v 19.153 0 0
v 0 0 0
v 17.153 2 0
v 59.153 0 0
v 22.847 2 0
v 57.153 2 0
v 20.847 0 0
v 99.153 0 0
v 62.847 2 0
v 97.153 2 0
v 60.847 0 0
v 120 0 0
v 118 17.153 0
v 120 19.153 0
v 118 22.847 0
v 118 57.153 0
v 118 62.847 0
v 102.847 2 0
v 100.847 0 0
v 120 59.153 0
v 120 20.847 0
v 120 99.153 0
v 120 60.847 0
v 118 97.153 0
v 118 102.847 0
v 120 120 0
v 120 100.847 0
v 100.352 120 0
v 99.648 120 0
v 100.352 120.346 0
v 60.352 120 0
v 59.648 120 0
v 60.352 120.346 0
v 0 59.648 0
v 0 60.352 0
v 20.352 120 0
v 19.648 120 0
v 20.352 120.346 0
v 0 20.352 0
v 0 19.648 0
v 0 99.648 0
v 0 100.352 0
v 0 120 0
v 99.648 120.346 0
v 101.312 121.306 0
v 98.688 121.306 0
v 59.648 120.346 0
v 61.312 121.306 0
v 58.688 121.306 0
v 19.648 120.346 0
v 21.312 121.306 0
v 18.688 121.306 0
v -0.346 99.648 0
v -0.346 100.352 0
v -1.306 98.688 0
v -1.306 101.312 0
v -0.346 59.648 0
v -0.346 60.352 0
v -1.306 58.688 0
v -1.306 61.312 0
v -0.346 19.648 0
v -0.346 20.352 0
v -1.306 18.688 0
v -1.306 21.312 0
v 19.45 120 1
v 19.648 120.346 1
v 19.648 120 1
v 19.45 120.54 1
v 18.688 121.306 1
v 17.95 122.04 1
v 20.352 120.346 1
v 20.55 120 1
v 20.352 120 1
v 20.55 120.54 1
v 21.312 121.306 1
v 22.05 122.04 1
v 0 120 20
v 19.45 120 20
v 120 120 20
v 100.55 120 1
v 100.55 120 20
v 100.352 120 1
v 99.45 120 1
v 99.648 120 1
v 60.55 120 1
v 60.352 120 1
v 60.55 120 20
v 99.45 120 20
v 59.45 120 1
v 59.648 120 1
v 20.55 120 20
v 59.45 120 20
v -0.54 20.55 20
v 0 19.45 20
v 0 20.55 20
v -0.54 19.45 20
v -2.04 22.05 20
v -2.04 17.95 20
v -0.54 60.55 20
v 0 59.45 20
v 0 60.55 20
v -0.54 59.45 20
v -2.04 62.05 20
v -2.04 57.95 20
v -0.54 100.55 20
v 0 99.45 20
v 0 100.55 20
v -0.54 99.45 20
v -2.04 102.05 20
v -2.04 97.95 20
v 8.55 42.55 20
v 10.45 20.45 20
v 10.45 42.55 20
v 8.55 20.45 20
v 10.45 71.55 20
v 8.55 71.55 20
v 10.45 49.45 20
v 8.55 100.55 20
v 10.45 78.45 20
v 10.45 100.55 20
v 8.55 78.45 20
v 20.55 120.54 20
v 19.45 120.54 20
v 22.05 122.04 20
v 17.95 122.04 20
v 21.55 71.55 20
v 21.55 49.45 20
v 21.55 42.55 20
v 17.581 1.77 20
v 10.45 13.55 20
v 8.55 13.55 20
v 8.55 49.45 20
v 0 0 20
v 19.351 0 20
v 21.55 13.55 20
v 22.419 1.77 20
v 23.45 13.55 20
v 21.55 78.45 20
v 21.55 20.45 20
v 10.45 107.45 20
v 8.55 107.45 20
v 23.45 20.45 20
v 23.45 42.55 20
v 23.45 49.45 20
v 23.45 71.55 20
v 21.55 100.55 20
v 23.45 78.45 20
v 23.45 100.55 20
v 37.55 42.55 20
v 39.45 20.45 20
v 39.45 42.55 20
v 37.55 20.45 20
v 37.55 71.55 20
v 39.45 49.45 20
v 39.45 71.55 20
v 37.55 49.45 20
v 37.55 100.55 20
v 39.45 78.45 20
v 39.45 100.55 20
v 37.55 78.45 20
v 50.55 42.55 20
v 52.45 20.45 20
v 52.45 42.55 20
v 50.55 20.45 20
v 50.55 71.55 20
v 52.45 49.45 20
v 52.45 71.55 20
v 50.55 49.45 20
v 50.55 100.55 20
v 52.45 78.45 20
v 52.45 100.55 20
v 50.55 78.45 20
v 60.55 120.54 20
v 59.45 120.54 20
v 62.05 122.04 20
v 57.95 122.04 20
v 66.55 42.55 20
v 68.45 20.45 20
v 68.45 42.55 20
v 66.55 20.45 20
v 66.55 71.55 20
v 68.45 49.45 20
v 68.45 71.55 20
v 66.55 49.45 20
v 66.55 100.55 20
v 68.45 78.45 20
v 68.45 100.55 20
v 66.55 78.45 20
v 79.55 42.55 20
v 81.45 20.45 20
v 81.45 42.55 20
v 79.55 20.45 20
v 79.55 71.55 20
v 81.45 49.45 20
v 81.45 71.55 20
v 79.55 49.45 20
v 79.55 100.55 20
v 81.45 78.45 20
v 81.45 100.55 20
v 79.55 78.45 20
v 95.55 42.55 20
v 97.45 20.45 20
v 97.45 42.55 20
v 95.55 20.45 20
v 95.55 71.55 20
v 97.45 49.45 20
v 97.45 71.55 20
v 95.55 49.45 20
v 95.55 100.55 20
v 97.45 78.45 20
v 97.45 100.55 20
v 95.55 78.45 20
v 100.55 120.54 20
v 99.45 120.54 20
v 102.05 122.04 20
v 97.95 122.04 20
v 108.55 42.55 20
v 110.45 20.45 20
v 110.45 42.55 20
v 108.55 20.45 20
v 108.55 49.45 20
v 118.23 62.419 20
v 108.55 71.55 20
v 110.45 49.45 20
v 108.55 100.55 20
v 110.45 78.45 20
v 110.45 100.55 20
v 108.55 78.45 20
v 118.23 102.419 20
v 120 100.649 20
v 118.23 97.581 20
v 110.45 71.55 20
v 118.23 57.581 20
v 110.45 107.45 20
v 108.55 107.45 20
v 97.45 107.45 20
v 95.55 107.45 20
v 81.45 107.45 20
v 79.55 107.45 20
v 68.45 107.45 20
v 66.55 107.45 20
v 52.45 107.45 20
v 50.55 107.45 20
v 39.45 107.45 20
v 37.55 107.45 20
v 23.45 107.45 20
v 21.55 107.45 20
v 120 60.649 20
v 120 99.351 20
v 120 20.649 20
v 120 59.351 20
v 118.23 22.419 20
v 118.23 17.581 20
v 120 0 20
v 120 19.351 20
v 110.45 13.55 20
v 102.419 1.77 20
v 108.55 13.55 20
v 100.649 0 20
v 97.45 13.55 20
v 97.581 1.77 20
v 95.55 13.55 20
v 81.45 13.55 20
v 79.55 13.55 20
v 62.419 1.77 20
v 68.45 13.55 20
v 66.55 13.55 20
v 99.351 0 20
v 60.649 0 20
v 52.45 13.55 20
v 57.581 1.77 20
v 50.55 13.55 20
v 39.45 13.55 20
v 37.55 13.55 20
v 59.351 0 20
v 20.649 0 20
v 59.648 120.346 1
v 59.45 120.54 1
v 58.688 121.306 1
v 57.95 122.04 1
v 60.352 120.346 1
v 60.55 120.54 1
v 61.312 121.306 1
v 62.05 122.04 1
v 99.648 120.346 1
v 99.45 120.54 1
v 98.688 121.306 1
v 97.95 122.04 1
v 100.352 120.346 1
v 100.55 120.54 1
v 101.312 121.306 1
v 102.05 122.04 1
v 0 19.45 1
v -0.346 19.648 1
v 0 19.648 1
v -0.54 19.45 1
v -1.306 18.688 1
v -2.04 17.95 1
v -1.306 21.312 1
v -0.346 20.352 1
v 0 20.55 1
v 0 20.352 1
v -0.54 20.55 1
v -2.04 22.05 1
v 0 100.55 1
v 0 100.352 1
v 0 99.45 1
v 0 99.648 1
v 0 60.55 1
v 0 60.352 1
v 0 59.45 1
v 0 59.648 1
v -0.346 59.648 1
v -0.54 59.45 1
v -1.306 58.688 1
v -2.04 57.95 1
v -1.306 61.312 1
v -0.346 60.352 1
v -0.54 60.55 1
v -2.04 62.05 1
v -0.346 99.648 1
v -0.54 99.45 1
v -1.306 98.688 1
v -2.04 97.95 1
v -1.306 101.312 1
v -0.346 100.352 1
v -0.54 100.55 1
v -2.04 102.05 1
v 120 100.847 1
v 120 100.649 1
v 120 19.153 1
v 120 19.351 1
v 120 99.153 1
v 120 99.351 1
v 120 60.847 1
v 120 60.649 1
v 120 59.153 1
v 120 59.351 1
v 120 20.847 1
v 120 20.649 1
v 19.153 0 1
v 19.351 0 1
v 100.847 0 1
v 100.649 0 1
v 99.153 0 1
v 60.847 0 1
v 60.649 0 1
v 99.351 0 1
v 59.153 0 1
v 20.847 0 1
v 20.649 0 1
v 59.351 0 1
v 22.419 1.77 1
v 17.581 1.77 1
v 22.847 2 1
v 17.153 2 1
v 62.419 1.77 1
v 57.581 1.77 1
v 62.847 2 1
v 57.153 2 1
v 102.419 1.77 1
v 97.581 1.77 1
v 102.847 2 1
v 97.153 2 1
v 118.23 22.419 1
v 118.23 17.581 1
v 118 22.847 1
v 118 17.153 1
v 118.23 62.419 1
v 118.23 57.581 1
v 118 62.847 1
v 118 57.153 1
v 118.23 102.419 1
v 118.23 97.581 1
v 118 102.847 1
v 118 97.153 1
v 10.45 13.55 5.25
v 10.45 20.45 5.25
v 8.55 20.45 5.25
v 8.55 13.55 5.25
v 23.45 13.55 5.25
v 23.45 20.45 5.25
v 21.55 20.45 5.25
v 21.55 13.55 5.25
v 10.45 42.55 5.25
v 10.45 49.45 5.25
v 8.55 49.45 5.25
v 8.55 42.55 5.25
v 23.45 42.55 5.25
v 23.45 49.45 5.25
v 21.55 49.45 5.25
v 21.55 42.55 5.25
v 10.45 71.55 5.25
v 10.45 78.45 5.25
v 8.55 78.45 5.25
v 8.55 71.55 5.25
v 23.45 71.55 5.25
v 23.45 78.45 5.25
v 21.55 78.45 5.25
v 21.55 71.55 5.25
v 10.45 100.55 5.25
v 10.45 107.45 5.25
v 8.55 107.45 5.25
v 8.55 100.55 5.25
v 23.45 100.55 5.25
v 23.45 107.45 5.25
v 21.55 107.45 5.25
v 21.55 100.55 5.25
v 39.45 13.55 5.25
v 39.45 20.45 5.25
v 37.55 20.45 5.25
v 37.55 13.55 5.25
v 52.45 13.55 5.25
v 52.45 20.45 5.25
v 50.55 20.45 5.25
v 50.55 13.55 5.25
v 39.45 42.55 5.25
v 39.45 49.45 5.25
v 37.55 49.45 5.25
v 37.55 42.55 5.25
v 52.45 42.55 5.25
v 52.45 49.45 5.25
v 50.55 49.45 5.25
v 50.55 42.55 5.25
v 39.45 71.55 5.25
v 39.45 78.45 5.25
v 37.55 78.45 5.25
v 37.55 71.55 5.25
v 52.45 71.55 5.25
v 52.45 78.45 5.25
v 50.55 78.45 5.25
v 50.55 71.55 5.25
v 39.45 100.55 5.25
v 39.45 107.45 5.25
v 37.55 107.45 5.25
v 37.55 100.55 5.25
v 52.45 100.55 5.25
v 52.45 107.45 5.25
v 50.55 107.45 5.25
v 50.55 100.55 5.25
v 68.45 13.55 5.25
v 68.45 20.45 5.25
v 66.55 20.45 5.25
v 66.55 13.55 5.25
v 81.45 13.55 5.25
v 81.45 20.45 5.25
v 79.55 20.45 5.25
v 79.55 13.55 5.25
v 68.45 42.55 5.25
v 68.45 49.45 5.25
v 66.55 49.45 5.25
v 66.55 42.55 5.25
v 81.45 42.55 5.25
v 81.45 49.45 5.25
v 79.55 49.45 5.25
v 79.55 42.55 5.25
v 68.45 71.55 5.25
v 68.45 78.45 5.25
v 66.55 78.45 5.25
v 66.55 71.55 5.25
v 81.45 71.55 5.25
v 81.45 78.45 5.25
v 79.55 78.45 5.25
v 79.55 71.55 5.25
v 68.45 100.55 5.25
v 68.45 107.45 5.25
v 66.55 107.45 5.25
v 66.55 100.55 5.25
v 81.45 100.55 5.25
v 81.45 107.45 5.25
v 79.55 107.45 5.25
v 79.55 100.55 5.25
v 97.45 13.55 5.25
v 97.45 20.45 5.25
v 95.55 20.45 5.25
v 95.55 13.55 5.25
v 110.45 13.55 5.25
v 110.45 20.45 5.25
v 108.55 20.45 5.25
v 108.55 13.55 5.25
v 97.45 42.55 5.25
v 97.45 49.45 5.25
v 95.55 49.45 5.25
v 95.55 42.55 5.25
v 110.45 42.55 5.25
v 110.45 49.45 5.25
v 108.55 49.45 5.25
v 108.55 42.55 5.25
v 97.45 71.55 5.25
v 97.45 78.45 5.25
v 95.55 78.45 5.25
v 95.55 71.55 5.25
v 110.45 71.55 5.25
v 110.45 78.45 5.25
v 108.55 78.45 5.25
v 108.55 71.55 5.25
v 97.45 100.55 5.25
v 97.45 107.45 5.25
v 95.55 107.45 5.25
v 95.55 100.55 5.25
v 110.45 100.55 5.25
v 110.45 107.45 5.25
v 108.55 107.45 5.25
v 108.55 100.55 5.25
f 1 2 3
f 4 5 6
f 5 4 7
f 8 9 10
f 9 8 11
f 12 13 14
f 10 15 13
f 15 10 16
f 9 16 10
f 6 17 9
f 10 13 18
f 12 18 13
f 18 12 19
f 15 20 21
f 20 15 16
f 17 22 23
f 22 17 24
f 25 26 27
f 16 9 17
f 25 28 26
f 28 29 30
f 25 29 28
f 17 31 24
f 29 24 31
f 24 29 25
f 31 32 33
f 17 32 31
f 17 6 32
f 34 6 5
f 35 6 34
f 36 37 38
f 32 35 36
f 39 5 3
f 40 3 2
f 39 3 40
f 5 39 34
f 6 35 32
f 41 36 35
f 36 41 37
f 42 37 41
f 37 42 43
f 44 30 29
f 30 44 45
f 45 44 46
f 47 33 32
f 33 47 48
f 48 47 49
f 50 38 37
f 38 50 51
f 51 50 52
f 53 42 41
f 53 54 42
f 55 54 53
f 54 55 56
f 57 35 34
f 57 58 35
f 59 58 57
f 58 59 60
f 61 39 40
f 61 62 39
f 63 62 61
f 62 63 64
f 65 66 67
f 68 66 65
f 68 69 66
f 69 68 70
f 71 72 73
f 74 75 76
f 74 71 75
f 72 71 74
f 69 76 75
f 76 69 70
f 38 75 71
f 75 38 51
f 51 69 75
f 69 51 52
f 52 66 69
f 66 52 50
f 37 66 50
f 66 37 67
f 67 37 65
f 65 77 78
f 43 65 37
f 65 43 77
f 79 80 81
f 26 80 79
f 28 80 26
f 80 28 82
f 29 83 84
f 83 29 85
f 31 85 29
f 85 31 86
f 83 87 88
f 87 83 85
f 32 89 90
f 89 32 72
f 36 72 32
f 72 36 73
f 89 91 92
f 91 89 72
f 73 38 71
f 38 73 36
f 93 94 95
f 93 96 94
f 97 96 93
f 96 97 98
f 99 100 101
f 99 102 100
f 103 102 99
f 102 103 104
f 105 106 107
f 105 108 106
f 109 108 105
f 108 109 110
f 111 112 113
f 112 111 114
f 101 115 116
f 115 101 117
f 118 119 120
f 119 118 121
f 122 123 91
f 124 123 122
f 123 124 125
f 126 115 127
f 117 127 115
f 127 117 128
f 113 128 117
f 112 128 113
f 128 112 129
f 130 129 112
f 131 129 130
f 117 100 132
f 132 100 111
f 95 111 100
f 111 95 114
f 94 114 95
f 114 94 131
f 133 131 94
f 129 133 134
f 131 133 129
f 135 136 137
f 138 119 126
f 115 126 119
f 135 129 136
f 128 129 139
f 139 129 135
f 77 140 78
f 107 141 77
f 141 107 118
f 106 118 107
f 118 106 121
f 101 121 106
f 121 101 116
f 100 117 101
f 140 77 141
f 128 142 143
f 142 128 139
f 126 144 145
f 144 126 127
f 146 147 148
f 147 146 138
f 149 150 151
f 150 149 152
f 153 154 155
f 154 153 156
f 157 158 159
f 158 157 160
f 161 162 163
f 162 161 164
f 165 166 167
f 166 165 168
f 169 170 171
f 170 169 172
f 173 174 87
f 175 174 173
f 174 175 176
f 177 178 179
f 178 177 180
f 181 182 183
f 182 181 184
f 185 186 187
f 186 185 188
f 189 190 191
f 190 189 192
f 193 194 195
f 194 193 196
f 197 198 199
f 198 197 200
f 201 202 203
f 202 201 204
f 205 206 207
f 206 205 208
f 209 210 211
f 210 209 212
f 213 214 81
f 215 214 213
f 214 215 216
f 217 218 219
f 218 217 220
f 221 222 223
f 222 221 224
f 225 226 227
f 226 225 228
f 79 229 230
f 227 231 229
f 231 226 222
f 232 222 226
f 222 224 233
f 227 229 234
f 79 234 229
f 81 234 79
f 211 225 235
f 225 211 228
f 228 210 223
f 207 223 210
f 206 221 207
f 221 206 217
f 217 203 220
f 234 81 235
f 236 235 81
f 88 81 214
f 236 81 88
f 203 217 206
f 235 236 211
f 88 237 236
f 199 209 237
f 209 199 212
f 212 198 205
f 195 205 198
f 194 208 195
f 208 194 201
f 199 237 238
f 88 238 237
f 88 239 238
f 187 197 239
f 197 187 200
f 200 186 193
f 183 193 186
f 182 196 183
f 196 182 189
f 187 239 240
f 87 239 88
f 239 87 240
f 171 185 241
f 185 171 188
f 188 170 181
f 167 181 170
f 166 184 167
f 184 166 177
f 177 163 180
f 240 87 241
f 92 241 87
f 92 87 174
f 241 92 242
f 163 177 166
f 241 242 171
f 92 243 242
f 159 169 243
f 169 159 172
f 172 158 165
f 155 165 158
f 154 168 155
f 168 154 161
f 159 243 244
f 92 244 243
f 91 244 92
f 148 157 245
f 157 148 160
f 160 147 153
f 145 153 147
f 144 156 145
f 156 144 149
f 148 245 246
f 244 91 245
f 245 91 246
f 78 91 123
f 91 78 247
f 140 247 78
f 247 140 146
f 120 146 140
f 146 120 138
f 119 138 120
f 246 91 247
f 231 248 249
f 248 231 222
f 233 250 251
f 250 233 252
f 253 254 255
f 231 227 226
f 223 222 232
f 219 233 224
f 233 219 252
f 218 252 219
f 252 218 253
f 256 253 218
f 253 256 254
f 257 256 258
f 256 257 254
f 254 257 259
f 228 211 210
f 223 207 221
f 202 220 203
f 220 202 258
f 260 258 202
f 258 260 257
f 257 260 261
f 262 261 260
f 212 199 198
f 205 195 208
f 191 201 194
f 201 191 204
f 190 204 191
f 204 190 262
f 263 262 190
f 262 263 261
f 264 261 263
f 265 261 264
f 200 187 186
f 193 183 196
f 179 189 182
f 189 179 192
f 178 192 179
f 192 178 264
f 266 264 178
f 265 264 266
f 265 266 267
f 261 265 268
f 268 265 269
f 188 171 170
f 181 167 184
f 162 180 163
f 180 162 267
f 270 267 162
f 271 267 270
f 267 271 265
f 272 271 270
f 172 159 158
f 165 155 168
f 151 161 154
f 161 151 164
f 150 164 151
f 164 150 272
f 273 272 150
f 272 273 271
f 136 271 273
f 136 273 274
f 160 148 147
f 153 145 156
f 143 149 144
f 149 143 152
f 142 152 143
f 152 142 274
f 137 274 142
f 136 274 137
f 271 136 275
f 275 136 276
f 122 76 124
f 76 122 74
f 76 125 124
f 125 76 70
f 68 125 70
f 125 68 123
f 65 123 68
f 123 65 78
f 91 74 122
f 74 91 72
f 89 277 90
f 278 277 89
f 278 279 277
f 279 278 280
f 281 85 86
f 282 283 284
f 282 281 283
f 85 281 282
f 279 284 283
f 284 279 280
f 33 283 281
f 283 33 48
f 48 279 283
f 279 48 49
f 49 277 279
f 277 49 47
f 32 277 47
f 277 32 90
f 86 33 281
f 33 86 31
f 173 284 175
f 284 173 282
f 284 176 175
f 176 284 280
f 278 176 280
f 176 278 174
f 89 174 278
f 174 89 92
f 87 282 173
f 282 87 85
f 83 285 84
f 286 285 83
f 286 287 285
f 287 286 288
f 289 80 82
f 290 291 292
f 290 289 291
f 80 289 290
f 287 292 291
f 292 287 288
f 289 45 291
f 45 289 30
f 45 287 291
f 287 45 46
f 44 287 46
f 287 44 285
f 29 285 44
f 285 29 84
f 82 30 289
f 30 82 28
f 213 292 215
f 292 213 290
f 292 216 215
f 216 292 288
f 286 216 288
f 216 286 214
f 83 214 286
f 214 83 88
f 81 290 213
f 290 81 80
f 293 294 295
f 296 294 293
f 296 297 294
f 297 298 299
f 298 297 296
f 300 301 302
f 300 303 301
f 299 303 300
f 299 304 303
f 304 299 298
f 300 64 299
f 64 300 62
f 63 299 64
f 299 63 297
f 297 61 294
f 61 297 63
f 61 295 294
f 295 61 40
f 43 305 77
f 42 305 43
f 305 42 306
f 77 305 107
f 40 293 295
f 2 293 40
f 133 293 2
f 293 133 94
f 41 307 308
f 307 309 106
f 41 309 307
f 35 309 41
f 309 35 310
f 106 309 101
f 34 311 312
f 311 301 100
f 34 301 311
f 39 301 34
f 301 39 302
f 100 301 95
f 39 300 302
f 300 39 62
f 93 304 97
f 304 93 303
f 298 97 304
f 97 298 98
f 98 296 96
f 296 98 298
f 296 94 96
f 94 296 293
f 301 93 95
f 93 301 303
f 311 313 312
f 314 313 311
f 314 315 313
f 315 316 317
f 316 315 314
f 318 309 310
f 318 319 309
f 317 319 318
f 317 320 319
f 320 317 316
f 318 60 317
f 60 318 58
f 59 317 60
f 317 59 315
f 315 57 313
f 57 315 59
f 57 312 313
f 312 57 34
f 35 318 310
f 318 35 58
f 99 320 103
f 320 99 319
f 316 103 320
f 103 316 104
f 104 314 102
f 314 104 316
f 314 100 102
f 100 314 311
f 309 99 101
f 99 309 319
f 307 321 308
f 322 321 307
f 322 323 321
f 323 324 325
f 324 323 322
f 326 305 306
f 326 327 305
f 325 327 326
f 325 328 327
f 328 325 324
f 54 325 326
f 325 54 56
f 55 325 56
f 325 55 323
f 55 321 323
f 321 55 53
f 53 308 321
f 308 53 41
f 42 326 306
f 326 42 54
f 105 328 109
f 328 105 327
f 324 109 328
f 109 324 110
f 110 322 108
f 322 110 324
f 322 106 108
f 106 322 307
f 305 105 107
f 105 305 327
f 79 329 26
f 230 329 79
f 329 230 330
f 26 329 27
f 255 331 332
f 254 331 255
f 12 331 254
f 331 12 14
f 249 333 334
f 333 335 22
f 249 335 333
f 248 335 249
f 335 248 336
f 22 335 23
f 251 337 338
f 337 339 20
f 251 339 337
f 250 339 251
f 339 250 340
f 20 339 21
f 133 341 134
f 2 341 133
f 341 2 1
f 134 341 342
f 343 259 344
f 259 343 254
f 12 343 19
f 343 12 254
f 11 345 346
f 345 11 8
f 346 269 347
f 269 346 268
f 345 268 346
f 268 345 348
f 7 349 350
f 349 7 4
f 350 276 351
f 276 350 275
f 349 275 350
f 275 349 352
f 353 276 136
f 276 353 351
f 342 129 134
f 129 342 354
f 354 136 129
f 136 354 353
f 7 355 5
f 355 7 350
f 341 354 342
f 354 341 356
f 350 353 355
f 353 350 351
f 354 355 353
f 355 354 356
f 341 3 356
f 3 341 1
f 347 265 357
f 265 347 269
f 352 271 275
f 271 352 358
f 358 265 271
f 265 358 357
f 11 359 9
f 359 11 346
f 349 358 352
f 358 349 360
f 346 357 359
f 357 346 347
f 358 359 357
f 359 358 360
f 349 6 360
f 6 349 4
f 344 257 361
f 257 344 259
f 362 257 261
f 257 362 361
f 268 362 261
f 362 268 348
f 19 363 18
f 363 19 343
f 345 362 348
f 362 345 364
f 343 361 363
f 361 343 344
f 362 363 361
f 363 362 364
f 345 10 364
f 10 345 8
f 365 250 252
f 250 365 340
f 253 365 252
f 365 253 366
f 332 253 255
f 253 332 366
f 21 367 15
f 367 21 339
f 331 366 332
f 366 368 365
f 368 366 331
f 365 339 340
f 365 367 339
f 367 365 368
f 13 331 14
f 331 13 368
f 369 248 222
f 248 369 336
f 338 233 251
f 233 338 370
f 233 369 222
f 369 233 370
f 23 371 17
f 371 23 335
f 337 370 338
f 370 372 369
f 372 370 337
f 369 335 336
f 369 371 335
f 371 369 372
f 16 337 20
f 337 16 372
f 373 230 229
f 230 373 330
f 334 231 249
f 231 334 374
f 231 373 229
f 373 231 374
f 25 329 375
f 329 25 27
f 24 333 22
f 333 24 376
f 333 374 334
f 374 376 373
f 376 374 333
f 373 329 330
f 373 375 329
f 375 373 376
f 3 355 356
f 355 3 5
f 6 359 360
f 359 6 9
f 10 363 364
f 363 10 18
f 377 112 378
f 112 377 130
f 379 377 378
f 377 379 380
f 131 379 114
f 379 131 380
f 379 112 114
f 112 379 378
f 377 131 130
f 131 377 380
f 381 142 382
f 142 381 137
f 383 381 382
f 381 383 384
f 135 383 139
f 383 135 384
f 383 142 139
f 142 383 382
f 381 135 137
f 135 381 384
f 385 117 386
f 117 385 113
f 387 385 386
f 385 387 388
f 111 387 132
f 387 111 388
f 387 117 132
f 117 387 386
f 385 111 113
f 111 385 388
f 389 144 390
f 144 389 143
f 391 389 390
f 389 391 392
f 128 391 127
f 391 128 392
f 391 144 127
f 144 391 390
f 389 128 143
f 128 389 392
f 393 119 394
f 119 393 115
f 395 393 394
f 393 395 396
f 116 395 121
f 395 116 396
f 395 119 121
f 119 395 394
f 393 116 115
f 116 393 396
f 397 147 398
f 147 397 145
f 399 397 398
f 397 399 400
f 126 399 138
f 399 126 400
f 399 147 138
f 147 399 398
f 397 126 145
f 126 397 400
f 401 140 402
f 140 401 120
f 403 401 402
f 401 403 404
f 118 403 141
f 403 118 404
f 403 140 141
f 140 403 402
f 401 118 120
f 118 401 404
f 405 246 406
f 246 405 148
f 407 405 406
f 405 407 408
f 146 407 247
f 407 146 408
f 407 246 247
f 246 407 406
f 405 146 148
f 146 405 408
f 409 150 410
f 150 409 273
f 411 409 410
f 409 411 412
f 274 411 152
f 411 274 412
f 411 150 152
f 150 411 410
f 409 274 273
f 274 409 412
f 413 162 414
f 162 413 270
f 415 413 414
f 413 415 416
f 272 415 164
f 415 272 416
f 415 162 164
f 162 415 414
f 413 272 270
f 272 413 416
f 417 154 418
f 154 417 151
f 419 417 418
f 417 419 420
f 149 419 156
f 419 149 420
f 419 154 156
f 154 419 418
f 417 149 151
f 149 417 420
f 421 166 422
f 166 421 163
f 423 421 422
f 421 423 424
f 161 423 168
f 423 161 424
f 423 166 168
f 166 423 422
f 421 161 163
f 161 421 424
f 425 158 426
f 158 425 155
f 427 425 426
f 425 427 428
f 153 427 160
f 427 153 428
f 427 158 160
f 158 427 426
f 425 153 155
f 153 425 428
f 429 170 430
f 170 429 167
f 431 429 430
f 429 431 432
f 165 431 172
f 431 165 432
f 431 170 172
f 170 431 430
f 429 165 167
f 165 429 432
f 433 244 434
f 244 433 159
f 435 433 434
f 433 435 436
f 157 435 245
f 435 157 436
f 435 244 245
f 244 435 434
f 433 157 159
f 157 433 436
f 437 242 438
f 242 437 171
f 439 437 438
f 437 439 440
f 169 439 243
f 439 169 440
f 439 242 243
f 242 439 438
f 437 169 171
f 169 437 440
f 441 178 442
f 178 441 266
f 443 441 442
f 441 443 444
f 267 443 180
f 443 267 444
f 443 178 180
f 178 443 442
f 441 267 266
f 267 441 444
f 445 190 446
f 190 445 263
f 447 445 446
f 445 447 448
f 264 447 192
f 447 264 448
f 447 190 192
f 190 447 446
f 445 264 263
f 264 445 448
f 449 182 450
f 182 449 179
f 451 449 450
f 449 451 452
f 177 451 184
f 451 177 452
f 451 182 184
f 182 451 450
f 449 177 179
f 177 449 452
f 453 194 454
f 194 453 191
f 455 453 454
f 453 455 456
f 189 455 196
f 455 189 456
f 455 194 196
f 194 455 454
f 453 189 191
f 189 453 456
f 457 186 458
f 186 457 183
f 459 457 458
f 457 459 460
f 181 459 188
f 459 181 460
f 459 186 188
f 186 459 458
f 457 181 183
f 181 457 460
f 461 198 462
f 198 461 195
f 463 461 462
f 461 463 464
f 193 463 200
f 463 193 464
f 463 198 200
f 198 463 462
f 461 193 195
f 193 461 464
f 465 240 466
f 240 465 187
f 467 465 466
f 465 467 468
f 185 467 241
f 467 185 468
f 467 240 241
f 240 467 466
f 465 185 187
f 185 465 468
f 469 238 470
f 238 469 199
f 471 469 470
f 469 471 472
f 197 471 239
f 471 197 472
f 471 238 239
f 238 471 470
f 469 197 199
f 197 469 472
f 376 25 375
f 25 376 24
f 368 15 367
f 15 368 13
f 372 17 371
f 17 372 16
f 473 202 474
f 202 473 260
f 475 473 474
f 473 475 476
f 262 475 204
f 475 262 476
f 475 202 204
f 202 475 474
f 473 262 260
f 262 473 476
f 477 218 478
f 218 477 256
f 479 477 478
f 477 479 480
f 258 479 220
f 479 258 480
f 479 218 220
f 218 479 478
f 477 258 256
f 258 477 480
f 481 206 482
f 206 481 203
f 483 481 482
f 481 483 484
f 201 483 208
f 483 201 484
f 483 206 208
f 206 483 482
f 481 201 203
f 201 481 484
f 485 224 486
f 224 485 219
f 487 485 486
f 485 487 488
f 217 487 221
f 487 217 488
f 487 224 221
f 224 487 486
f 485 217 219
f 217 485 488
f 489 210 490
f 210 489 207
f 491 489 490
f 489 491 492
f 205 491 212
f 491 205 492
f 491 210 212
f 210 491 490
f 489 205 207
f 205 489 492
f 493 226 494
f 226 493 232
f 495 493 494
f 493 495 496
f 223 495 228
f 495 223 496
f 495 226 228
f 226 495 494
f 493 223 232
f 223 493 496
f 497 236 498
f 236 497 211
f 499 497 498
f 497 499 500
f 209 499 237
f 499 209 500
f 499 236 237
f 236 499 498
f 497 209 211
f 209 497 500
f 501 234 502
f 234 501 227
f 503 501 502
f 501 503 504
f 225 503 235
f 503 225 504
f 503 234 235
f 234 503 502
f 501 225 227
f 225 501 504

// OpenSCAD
// file: interlockingmodule.scad
//this section defines a module for creating a "rounded" bottom to the box, useful when storing small parts
module RoundBottom(width, length, height){    
    translate([0,length,0])rotate([90,0,0])
    linear_extrude(length, center=false)
    
    difference() {
        translate([-width/2,0,0])square([width,height/2],center=false);
        translate([0,height/2,0])resize([width,height]) circle(d=width*10);
    }
}


module interlockingbox(
    //Box Width in units
    BoxWidthUnits = 3,
    //Box Length in units
    BoxLengthUnits = 3,
    //Box Height in mm
    BoxHeight = 120,
    //Box Floor Thickness in mm
    BoxFloor = 2,
    //North Wall open or closed
    NorthWallOpen = 0, // [0:Closed, 1:Open]
    //South Wall open or closed
    SouthWallOpen = 0 // [0:Closed, 1:Open]
)
{
echo(version=version(2.0));
//comments: Version 2 adds anti-"elephant foot" scaling at bottom of dovetail sections
/* [Size] */
//Box unit size in mm. This defines the size of 1 'unit' for your box.
BoxUnits = 40;
BoxWidth = BoxWidthUnits * BoxUnits;
BoxLength = BoxLengthUnits * BoxUnits;
//Box Wall Thickness in mm
BoxWall = 1;
//Fit Factor. Greater factor = looser fit
FitFactor = 0.18;  // [0:0.05:0.4]
//RoundedBottom = "EW"; // [EW:East-West, NS:North-South]
RoundedBottom = ""; // [EW:East-West, NS:North-South]

/* [Walls] */

/* [Dovetail] */
//Dovetail inside length in mm
DTInsideLength = 1.1;
//Dovetail angle in degrees
DTAngle = 45;
//Dovetail width in mm
DTWidth = 1.5;

/* [Hidden] */
//This helps calculate the length of the 'long' side of the dovetail
DTx=tan(DTAngle)*DTWidth;
//This polygon defines the dovetail shape
DTShape = [[0,0],[DTInsideLength/2,0],[DTInsideLength/2+DTx,DTWidth],[-DTInsideLength/2-DTx,DTWidth],[-DTInsideLength/2,0]];



union(){
    //creates and transforms rounded bottom
    if (RoundedBottom=="EW") {
    translate([0,(BoxWidth/2)+BoxWall,BoxFloor])
    rotate([0,0,-90])
    RoundBottom(BoxWidth-DTWidth-(BoxWall),BoxLength-DTWidth-BoxWall,2*(BoxHeight-BoxFloor));
    }

    //creates rounded bottom oriented North-South
    if (RoundedBottom=="NS") {
    translate([(BoxLength/2)-BoxWall,DTWidth+BoxWall/2,BoxFloor])
    rotate([0,0,0])
    RoundBottom(BoxLength-DTWidth-(BoxWall),BoxWidth-DTWidth-BoxWall,2*(BoxHeight-BoxFloor));
    }

    //Creates main box,without round bottom
    difference(){
        
    union(){
        //main box
    cube([BoxLength,BoxWidth,BoxHeight], center=false);

        //male dovetails
    for (i=[1:BoxLengthUnits])
    translate([(i-1)*BoxUnits+(BoxUnits/2),BoxWidth,0])
        //in 2 sections. first section is slightly scaled down to counter "elephant foot"
        union(){
            linear_extrude(height=1, center=false)
                scale([1-(2*FitFactor),1-(2*FitFactor),1])
                union(){        
                    //this adds a slight offset to the male dovetail for a looser fit
                    translate([-DTInsideLength/2,0,0])
                    square([DTInsideLength,DTWidth]);
                    //main dovetail shape
                    translate([0,DTWidth*FitFactor*2,0])
                    polygon(DTShape);
                };
            translate([0,0,1])
            linear_extrude(height=BoxHeight-1, center=false)
                    union(){
                    //this adds a slight offset to the male dovetail for a looser fit
                    translate([-DTInsideLength/2,0,0])
                    square([DTInsideLength,DTWidth]);
                    //main dovetail shape
                    translate([0,DTWidth*FitFactor*2,0])
                    polygon(DTShape);
                    };
        }        

    for (i=[1:BoxWidthUnits])
    translate([0,(i-1)*BoxUnits+(BoxUnits/2),0])
        //in 2 sections. first section is slightly scaled down to counter "elephant foot"
        rotate([0,0,90])
        union(){
            linear_extrude(height=1, center=false)				//1mm high anti-elephant foot section
                scale([1-(2*FitFactor),1-(2*FitFactor),1])
                union(){        
                    //this adds a slight offset to the male dovetail for a looser fit
                    translate([-DTInsideLength/2,0,0])
                    square([DTInsideLength,DTWidth]);
                    //main dovetail shape
                    translate([0,DTWidth*FitFactor*2,0])
                    polygon(DTShape);
                };
            translate([0,0,1])
            linear_extrude(height=BoxHeight-1, center=false)
                union(){
                    //male dovetail offset
                    translate([-DTInsideLength/2,0,0])
                    square([DTInsideLength,DTWidth]);
                    //main dovetail shape
                    translate([0,DTWidth*FitFactor*2,0])
                    polygon(DTShape);
                };
        }
    }
    //female dovetails
    for (i=[1:BoxLengthUnits])
        union(){
            translate([(i-1)*BoxUnits+(BoxUnits/2),0,0])
                scale([1+FitFactor,1+FitFactor,1])
                linear_extrude(height=BoxHeight, center=false)
                polygon(DTShape);
        
            //added a second dovetail cutout at the bottom, scaled up to counter "elephant foot" when printed
            translate([(i-1)*BoxUnits+(BoxUnits/2),0,0])
                scale([1+(3*FitFactor),1+(3*FitFactor),1])
                linear_extrude(height=1, center=false)
                polygon(DTShape);					
        }

    for (i=[1:BoxWidthUnits])
        union(){
            translate([BoxLength,(i-1)*BoxUnits+(BoxUnits/2),0])
                rotate([0,0,90])
                    scale([1+FitFactor,1+FitFactor,1])
                        linear_extrude(height=BoxHeight, center=false)
                            polygon(DTShape);
            //added a second dovetail cutout at the bottom, scaled up to counter "elephant foot" when printed
            translate([BoxLength,(i-1)*BoxUnits+(BoxUnits/2),0])
                rotate([0,0,90])
                    scale([1+(3*FitFactor),1+(3*FitFactor),1])
                        linear_extrude(height=1, center=false)
                            polygon(DTShape);	
        }
    //carves out main box
    translate([BoxWall,DTWidth+BoxWall,BoxFloor])
        cube([BoxLength-(2*BoxWall)-DTWidth, (BoxWidth-(2*BoxWall)-DTWidth), BoxHeight]);

    if (NorthWallOpen)
        translate([-DTWidth*(1+FitFactor+FitFactor),BoxWall+DTWidth,BoxFloor])
            cube([BoxWall+(DTWidth*(1+FitFactor+FitFactor)), (BoxWidth-(2*BoxWall)-DTWidth), BoxHeight]);    

    if (SouthWallOpen)
        translate([BoxLength-(BoxWall)-DTWidth,BoxWall+DTWidth,BoxFloor])
            cube([BoxWall+DTWidth, (BoxWidth-(2*BoxWall)-DTWidth), BoxHeight]);

    }
  }
}

// Cutout to make sure the actual box with groves is properly printed
// Use this with difference() to remove trim internal to fit the box.
module negativeBox(
    //Box Width in units
    BoxWidthUnits = 3,
    //Box Length in units
    BoxLengthUnits = 3,
    //Box Height in mm
    BoxHeight = 120,
    //Box unit size in mm. This defines the size of 1 'unit' for your box.
    BoxUnits = 40,
)
{
    difference () {
        translate([-5,-3,0])
        cube([BoxLengthUnits*BoxUnits+8,BoxWidthUnits*BoxUnits+8,BoxHeight]);

    translate([0.5,2,0])
        cube([BoxLengthUnits*BoxUnits-2.5,BoxWidthUnits*BoxUnits-2.5,BoxHeight]);
    }
}

interlockingbox(2,3,40);

// This will create a sliver of a wall if working properly
//difference() {
//    interlockingbox(2,3,40);
//    negativeBox(2,3,40);
//}
// main file
use <interlockingmodule.scad>

height=20;
interval = 30;

BoxUnits=40;
BoxWidthUnits=3;
BoxLengthUnits=3;

WallAdjust = 1;

interlockingbox(BoxWidthUnits,BoxLengthUnits,height);

for (x=[interval/2+1*WallAdjust:interval-WallAdjust:BoxUnits*BoxWidthUnits])
    for (y=[interval/2+2*WallAdjust:interval-WallAdjust:BoxUnits*BoxWidthUnits])
        translate([x,y,height/2]) acsocket(30,30,20);

module acsocket(x=38,y=38,z=16.5) {
  overextrusion = 0.2;
  pin_thickness = 1.5 + 2 * overextrusion;
  pin_width = 6.5 + 2 * overextrusion;
  pin_length = 16.5;
  newZ=max(z,pin_length);
  difference() {
    cube([x,y,newZ],center=true);
    translate([-6.5,0,newZ-pin_length])
      cube([pin_thickness,pin_width,pin_length],center=true);
    translate([6.5,0,newZ-pin_length])
      cube([pin_thickness,pin_width,pin_length],center=true);
  }
}
